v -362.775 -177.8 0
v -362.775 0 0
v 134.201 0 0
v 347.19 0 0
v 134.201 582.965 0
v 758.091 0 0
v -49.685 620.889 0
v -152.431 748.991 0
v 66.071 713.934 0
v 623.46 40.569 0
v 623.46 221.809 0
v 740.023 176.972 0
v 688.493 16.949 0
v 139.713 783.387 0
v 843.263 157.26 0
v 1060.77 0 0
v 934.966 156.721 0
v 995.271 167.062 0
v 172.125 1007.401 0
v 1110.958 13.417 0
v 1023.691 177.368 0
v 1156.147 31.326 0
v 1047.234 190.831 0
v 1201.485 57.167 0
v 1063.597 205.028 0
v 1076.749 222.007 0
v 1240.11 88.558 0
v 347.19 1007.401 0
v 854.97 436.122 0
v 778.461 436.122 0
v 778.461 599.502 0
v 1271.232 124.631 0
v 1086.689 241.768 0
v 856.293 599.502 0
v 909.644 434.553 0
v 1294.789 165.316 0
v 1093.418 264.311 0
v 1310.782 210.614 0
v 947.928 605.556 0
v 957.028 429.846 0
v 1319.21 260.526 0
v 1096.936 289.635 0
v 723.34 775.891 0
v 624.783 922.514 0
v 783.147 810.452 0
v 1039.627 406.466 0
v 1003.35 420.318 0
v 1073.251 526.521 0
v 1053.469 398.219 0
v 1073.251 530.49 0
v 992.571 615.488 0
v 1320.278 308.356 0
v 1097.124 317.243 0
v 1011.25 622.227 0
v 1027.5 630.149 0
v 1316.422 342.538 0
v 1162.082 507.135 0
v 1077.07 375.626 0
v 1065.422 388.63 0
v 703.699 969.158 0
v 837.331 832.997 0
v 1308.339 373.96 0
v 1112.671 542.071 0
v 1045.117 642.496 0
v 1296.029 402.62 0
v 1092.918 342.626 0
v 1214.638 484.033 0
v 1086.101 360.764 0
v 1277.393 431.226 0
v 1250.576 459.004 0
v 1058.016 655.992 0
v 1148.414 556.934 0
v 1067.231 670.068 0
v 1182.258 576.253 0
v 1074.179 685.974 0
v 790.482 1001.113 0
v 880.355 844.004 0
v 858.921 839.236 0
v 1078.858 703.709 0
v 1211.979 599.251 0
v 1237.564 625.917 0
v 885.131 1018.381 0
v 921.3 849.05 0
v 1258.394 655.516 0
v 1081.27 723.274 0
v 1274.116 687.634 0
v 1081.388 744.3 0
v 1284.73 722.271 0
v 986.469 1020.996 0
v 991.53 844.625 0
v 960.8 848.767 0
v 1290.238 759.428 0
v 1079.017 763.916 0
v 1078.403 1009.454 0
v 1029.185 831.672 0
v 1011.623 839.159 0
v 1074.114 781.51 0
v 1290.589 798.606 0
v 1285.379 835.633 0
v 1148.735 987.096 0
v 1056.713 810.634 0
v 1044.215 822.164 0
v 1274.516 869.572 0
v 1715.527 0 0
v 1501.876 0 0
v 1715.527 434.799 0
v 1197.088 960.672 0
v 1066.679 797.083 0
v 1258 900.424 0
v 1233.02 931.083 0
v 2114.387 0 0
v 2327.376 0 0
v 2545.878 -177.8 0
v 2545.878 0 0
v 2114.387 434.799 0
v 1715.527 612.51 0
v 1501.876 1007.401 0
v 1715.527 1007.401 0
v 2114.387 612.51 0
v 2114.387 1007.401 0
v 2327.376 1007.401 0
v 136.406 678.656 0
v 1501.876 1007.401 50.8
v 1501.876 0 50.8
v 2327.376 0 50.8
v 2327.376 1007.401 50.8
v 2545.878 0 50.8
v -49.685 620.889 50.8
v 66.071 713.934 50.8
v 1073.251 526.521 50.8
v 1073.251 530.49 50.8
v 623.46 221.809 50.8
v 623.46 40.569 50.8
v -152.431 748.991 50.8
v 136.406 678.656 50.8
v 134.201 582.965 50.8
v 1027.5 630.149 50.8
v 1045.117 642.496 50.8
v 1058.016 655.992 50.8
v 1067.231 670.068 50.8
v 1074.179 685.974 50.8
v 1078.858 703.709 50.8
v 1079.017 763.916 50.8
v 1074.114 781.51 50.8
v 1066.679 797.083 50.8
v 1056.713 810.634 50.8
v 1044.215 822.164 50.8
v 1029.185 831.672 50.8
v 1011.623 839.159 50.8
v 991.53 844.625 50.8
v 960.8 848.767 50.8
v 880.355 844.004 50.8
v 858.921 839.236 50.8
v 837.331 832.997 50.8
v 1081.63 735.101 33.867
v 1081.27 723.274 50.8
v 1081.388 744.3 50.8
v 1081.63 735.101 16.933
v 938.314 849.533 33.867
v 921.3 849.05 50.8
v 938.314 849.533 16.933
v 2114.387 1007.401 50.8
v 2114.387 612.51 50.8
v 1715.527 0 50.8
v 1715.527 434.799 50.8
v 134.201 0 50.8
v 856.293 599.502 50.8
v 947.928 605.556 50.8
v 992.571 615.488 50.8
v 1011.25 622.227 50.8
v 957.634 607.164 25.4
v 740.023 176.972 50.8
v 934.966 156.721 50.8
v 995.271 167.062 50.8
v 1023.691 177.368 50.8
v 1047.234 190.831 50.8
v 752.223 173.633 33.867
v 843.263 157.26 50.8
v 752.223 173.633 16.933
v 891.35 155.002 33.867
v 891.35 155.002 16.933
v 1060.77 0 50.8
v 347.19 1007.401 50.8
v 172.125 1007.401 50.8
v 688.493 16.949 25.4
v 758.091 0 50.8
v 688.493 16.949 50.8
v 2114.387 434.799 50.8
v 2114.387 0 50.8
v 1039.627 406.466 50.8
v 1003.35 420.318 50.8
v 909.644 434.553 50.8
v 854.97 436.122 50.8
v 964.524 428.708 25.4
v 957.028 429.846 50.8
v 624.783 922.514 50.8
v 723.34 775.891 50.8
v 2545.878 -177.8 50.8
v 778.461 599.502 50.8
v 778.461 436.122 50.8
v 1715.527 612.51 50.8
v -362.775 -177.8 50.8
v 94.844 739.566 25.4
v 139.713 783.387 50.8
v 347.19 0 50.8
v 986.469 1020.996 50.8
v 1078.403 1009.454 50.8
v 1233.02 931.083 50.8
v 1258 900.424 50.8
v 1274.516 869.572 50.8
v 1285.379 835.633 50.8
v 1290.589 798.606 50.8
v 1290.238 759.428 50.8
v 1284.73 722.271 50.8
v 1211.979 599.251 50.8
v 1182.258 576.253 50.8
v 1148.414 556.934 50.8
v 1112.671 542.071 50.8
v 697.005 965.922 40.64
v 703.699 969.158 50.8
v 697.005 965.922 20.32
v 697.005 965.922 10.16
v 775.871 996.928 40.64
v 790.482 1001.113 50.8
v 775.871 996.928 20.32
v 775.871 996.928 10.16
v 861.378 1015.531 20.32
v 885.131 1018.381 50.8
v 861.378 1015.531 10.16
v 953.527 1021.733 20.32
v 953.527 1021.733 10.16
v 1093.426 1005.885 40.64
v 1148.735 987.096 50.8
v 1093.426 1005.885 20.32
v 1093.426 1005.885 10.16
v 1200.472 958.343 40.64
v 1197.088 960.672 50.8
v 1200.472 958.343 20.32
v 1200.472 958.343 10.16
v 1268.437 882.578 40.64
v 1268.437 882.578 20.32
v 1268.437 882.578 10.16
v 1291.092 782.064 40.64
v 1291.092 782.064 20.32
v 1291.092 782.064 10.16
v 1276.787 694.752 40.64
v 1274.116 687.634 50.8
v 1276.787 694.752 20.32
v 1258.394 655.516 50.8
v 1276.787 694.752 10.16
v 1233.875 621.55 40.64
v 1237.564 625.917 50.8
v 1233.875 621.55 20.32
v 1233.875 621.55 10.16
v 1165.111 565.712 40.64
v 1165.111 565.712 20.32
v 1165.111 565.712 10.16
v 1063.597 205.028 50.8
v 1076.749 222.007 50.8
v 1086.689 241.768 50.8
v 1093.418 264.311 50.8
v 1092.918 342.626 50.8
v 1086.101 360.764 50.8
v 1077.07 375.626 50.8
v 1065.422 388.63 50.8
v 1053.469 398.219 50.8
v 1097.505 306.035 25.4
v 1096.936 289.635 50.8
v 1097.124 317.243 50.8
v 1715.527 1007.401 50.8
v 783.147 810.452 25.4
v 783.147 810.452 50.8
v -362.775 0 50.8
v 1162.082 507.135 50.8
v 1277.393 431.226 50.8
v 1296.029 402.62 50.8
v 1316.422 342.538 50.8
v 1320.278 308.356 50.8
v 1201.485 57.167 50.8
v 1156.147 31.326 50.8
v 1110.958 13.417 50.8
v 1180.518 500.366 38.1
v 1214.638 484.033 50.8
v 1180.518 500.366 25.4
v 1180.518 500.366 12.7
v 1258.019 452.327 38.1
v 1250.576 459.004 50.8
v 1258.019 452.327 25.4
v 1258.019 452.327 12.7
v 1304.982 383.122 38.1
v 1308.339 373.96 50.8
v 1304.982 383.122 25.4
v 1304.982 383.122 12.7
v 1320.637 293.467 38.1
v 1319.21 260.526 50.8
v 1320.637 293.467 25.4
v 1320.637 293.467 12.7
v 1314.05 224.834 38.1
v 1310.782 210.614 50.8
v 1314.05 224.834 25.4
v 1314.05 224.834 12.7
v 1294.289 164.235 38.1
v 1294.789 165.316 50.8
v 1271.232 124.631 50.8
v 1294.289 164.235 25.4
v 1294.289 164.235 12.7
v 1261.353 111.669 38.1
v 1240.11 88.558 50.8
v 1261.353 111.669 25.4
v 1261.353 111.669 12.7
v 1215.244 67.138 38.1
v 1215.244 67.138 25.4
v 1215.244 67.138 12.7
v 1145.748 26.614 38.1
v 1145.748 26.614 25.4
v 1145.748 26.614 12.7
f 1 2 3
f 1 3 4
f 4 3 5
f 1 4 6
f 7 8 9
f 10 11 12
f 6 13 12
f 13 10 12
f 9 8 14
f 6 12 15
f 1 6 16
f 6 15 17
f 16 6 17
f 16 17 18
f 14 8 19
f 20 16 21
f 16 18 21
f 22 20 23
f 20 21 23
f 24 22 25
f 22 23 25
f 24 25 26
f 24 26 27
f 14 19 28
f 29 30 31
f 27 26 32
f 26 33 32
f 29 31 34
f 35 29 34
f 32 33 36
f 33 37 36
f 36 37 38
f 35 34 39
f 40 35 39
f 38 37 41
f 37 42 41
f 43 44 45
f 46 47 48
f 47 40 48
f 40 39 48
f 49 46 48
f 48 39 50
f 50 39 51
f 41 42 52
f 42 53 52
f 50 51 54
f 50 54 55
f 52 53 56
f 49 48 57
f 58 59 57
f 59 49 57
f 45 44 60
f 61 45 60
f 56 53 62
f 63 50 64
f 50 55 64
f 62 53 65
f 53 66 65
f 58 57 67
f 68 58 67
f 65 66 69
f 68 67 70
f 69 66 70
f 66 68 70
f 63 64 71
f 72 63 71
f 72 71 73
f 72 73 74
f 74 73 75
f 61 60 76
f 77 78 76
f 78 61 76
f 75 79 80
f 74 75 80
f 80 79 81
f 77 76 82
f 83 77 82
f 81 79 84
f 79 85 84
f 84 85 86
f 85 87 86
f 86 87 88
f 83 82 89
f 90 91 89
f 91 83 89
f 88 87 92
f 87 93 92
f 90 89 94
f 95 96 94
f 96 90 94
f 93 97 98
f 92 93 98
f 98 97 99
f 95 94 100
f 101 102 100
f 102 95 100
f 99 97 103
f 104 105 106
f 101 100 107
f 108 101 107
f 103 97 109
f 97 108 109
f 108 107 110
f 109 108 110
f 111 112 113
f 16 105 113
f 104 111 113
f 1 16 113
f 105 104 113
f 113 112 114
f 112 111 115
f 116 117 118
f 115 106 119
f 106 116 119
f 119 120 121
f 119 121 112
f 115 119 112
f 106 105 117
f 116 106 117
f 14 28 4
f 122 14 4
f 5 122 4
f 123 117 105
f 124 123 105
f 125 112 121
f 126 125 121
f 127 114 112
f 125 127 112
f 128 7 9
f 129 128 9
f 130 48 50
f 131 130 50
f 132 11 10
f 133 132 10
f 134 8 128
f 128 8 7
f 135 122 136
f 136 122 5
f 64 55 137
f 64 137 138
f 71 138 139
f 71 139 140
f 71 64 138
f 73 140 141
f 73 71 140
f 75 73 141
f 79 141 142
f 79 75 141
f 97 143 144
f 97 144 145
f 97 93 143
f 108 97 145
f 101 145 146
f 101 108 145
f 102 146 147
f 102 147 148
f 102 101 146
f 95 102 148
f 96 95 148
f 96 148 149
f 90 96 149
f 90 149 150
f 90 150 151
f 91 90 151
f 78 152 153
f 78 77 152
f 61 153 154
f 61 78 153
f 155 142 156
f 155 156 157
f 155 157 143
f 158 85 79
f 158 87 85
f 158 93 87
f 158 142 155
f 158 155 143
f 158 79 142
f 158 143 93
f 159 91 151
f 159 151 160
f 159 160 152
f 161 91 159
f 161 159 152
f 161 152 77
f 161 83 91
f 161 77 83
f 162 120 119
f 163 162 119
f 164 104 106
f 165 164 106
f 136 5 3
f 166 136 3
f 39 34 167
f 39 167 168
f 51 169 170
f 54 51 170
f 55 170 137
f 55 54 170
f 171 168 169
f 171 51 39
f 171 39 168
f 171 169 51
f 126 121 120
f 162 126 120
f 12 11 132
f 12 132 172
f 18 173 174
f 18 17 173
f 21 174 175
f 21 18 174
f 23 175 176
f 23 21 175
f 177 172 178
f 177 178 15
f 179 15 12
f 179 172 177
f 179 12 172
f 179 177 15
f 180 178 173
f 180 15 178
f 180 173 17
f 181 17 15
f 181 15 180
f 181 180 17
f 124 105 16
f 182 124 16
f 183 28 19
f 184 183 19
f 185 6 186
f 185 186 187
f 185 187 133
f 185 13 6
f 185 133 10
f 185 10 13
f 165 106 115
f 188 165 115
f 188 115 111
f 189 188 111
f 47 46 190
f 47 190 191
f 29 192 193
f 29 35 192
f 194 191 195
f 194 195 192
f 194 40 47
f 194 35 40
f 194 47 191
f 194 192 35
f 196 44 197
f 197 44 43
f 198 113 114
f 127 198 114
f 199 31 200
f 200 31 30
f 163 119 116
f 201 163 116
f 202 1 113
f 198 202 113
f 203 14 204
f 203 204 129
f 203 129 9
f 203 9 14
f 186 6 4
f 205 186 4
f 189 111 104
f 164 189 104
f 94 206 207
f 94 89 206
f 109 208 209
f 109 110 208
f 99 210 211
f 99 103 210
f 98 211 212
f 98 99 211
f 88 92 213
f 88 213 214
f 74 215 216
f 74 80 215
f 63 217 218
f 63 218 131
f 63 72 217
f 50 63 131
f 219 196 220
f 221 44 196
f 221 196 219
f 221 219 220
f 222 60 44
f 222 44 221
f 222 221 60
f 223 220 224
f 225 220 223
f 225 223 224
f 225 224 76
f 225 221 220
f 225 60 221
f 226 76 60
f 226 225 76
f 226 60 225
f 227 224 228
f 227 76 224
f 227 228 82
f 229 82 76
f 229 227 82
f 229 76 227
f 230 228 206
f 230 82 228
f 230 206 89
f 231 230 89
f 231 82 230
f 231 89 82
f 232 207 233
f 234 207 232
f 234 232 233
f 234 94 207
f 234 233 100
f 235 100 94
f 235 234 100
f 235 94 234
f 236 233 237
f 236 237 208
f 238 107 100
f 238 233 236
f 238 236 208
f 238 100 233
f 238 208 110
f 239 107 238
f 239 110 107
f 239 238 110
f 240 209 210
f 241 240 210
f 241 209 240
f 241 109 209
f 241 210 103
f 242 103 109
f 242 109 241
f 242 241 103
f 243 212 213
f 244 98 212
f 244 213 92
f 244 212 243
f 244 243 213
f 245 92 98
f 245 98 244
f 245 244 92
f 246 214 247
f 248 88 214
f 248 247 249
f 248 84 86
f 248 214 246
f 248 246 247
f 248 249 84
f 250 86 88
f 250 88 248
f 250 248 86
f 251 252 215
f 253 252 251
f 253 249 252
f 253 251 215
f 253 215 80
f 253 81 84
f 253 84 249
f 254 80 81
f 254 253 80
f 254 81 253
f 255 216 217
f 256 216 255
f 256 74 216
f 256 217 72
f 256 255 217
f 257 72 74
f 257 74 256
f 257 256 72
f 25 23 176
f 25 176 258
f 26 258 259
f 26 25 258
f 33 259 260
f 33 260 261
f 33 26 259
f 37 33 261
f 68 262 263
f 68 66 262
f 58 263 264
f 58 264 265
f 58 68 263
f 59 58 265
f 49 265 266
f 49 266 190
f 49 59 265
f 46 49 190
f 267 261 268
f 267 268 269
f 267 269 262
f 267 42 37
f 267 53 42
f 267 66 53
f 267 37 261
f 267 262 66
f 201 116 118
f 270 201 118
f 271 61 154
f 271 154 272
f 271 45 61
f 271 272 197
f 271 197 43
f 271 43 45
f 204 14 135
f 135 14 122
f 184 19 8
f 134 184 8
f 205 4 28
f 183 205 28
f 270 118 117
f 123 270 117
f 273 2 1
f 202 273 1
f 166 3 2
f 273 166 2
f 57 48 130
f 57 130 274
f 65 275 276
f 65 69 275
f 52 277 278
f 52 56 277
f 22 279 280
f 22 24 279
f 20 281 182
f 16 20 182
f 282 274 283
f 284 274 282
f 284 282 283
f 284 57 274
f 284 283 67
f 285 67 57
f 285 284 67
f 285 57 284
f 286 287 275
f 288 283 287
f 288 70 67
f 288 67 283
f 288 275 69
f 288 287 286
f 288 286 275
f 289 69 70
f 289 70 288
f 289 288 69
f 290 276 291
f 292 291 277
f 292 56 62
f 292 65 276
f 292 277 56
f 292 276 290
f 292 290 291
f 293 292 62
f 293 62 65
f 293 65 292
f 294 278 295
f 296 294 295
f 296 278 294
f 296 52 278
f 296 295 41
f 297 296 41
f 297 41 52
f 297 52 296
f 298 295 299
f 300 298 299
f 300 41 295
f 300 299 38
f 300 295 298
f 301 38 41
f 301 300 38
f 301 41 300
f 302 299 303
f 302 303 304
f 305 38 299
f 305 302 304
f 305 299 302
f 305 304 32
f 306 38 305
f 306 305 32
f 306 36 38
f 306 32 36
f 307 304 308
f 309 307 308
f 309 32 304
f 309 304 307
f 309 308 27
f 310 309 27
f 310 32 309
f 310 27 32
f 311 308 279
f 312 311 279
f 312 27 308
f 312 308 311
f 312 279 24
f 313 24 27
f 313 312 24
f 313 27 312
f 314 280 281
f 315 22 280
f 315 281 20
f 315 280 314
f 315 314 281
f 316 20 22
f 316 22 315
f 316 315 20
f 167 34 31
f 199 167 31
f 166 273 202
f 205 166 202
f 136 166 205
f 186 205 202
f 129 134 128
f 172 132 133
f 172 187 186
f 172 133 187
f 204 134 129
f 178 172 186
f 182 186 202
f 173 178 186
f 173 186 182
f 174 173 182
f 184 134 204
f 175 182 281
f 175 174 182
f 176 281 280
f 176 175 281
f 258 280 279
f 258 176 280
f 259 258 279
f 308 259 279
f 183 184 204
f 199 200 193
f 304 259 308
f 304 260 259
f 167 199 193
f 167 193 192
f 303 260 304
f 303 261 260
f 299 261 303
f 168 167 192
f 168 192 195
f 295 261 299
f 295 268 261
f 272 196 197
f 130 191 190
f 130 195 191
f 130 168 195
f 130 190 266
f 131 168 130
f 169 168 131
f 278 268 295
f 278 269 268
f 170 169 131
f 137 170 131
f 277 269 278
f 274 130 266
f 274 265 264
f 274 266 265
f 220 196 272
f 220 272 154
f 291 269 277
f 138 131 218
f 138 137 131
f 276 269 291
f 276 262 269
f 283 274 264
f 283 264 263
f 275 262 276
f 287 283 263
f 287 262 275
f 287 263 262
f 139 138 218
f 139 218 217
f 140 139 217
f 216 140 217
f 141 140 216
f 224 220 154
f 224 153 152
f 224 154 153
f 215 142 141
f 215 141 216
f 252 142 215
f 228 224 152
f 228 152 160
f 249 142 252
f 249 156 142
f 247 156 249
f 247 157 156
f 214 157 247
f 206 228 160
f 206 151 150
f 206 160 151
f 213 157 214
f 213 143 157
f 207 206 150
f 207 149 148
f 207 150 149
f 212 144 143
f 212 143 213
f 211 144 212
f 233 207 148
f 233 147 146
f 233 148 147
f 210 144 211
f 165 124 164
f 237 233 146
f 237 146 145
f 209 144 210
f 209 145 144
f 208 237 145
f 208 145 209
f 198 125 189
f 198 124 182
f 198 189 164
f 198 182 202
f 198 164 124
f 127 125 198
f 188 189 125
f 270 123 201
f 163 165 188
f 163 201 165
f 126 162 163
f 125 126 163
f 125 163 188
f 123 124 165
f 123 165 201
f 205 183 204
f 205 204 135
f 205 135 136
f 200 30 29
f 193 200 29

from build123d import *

# Parameters (mm, degrees)
F1_DEPTH = 50.8


# Not quite as in the source:
# - a feature names something its author has since deleted; it is built from what else it names


with BuildPart() as f1:
    # F0 (on Top) → F1 (new body)
    with BuildSketch(Plane.XY):
        with BuildLine():
            Line((-362.7747852802, 0), (-362.7747852802, -177.8))
            Line((-362.7747852802, -177.8), (2545.8779924975, -177.8))
            Line((2545.8779924975, -177.8), (2545.8779924975, 0))
            Line((2545.8779924975, 0), (2327.3762563864, 0))
            Line((2327.3762563864, 0), (2114.3866730531, 0))
            Line((2114.3866730531, 0), (1715.5272980531, 0))
            Line((1715.5272980531, 0), (1501.8762563864, 0))
            Line((1501.8762563864, 0), (1060.7698674064, 0))
            add(Edge.make_bspline(
                [(1060.7698674064, 0), (995.2549319361, -13.890625), (914.2807702753, -13.890625)],
                knots=[0.5859606644, 0.5859606644, 0.5859606644, 1, 1, 1], degree=2))
            add(Edge.make_bspline(
                [(914.2807702753, -13.890625), (831.4339258388, -13.890625), (758.0911932443, 0)],
                knots=[0, 0, 0, 0.5050353738, 0.5050353738, 0.5050353738], degree=2))
            Line((758.0911932443, 0), (347.1904924976, 0))
            Line((347.1904924976, 0), (134.2009091642, 0))
            Line((134.2009091642, 0), (-362.7747852802, 0))
        make_face()
        with BuildLine():
            Line((1060.7698674064, 0), (758.0911932443, 0))
            add(Edge.make_bspline(
                [(914.2807702753, -13.890625), (831.4339258388, -13.890625), (758.0911932443, 0)],
                knots=[0, 0, 0, 0.5050353738, 0.5050353738, 0.5050353738], degree=2))
            add(Edge.make_bspline(
                [(1060.7698674064, 0), (995.2549319361, -13.890625), (914.2807702753, -13.890625)],
                knots=[0.5859606644, 0.5859606644, 0.5859606644, 1, 1, 1], degree=2))
        make_face()
        with BuildLine():
            add(Edge.make_bspline(
                [(758.0911932443, 0), (686.2109644272, 13.6136365267), (623.4595897198, 40.5694444444)],
                knots=[0.5050353738, 0.5050353738, 0.5050353738, 1, 1, 1], degree=2))
            Line((758.0911932443, 0), (1060.7698674064, 0))
            add(Edge.make_bspline(
                [(1215.244311942, 67.1380208333), (1153.4885340032, 19.6584216858), (1060.7698674064, 0)],
                knots=[0, 0, 0, 0.5859606644, 0.5859606644, 0.5859606644], degree=2))
            add(Edge.make_bspline(
                [(1320.6366730531, 293.4670138889), (1320.6366730531, 148.1666666667), (1215.244311942, 67.1380208333)],
                knots=[0, 0, 0, 1, 1, 1], degree=2))
            add(Edge.make_bspline(
                [(1258.0186174976, 452.3272569444), (1320.6366730531, 393.3472222222), (1320.6366730531, 293.4670138889)],
                knots=[0, 0, 0, 1, 1, 1], degree=2))
            add(Edge.make_bspline(
                [(1073.2512563864, 526.5208333333), (1195.400561942, 511.3072916667), (1258.0186174976, 452.3272569444)],
                knots=[0, 0, 0, 1, 1, 1], degree=2))
            Line((1073.2512563864, 526.5208333333), (1073.2512563864, 530.4895833333))
            add(Edge.make_bspline(
                [(1233.8753883309, 621.5503472222), (1176.6592424976, 555.4045138889), (1073.2512563864, 530.4895833333)],
                knots=[0, 0, 0, 1, 1, 1], degree=2))
            add(Edge.make_bspline(
                [(1291.0915341642, 782.0642361111), (1291.0915341642, 687.6961805556), (1233.8753883309, 621.5503472222)],
                knots=[0, 0, 0, 1, 1, 1], degree=2))
            add(Edge.make_bspline(
                [(1200.4717424976, 958.3428819444), (1291.0915341642, 894.953125), (1291.0915341642, 782.0642361111)],
                knots=[0, 0, 0, 1, 1, 1], degree=2))
            add(Edge.make_bspline(
                [(953.5272980531, 1021.7326388889), (1109.8519508309, 1021.7326388889), (1200.4717424976, 958.3428819444)],
                knots=[0, 0, 0, 1, 1, 1], degree=2))
            add(Edge.make_bspline(
                [(624.7825063864, 922.5138888889), (762.5863258309, 1021.7326388889), (953.5272980531, 1021.7326388889)],
                knots=[0, 0, 0, 1, 1, 1], degree=2))
            Line((624.7825063864, 922.5138888889), (723.3397980531, 775.890625))
            add(Edge.make_bspline(
                [(837.3311174976, 832.9965277778), (785.9578536087, 816.4600694444), (723.3397980531, 775.890625)],
                knots=[0, 0, 0, 1, 1, 1], degree=2))
            add(Edge.make_bspline(
                [(938.3137563864, 849.5329861111), (888.7043813864, 849.5329861111), (837.3311174976, 832.9965277778)],
                knots=[0, 0, 0, 1, 1, 1], degree=2))
            add(Edge.make_bspline(
                [(1081.6297286087, 735.1006944444), (1081.6297286087, 849.5329861111), (938.3137563864, 849.5329861111)],
                knots=[0, 0, 0, 1, 1, 1], degree=2))
            add(Edge.make_bspline(
                [(1027.5003883309, 630.1493055556), (1081.6297286087, 660.796875), (1081.6297286087, 735.1006944444)],
                knots=[0, 0, 0, 1, 1, 1], degree=2))
            add(Edge.make_bspline(
                [(856.2929230531, 599.5017361111), (973.3710480531, 599.5017361111), (1027.5003883309, 630.1493055556)],
                knots=[0, 0, 0, 1, 1, 1], degree=2))
            Line((856.2929230531, 599.5017361111), (778.4613258309, 599.5017361111))
            Line((778.4613258309, 599.5017361111), (778.4613258309, 436.1215277778))
            Line((778.4613258309, 436.1215277778), (854.9700063864, 436.1215277778))
            add(Edge.make_bspline(
                [(1039.627124442, 406.4661458333), (981.7495202753, 436.1215277778), (854.9700063864, 436.1215277778)],
                knots=[0, 0, 0, 1, 1, 1], degree=2))
            add(Edge.make_bspline(
                [(1097.5047286087, 306.0347222222), (1097.5047286087, 376.8107638889), (1039.627124442, 406.4661458333)],
                knots=[0, 0, 0, 1, 1, 1], degree=2))
            add(Edge.make_bspline(
                [(1047.2338952753, 190.8307291667), (1097.5047286087, 226.6597222222), (1097.5047286087, 306.0347222222)],
                knots=[0, 0, 0, 1, 1, 1], degree=2))
            add(Edge.make_bspline(
                [(891.3502147198, 155.0017361111), (996.963061942, 155.0017361111), (1047.2338952753, 190.8307291667)],
                knots=[0, 0, 0, 1, 1, 1], degree=2))
            add(Edge.make_bspline(
                [(752.2234786087, 173.6328125), (822.5585480531, 155.0017361111), (891.3502147198, 155.0017361111)],
                knots=[0, 0, 0, 1, 1, 1], degree=2))
            add(Edge.make_bspline(
                [(623.4595897198, 221.8090277778), (681.8884091642, 192.2638888889), (752.2234786087, 173.6328125)],
                knots=[0, 0, 0, 1, 1, 1], degree=2))
            Line((623.4595897198, 221.8090277778), (623.4595897198, 40.5694444444))
        make_face()
        Polygon((2114.3866730531, 0), (2327.3762563864, 0), (2327.3762563864, 1007.4010416667), (2114.3866730531, 1007.4010416667), (2114.3866730531, 612.5104166667), (1715.5272980531, 612.5104166667), (1715.5272980531, 1007.4010416667), (1501.8762563864, 1007.4010416667), (1501.8762563864, 0), (1715.5272980531, 0), (1715.5272980531, 434.7986111111), (2114.3866730531, 434.7986111111), align=None)
        with BuildLine():
            Line((134.2009091642, 582.9652777778), (134.2009091642, 0))
            Line((134.2009091642, 0), (347.1904924976, 0))
            Line((347.1904924976, 0), (347.1904924976, 1007.4010416667))
            Line((347.1904924976, 1007.4010416667), (172.1245202753, 1007.4010416667))
            Line((172.1245202753, 1007.4010416667), (-152.4310352802, 748.9913194444))
            Line((-152.4310352802, 748.9913194444), (-49.6845075024, 620.8888888889))
            Line((-49.6845075024, 620.8888888889), (66.0707008309, 713.9340277778))
            add(Edge.make_bspline(
                [(139.713061942, 783.3871527778), (86.7963952753, 730.4704861111), (66.0707008309, 713.9340277778)],
                knots=[0, 0, 0, 1, 1, 1], degree=2))
            Line((139.713061942, 783.3871527778), (136.4057702753, 678.65625))
            Line((136.4057702753, 678.65625), (134.2009091642, 582.9652777778))
        make_face()
    extrude(amount=F1_DEPTH)


solid = f1.part
